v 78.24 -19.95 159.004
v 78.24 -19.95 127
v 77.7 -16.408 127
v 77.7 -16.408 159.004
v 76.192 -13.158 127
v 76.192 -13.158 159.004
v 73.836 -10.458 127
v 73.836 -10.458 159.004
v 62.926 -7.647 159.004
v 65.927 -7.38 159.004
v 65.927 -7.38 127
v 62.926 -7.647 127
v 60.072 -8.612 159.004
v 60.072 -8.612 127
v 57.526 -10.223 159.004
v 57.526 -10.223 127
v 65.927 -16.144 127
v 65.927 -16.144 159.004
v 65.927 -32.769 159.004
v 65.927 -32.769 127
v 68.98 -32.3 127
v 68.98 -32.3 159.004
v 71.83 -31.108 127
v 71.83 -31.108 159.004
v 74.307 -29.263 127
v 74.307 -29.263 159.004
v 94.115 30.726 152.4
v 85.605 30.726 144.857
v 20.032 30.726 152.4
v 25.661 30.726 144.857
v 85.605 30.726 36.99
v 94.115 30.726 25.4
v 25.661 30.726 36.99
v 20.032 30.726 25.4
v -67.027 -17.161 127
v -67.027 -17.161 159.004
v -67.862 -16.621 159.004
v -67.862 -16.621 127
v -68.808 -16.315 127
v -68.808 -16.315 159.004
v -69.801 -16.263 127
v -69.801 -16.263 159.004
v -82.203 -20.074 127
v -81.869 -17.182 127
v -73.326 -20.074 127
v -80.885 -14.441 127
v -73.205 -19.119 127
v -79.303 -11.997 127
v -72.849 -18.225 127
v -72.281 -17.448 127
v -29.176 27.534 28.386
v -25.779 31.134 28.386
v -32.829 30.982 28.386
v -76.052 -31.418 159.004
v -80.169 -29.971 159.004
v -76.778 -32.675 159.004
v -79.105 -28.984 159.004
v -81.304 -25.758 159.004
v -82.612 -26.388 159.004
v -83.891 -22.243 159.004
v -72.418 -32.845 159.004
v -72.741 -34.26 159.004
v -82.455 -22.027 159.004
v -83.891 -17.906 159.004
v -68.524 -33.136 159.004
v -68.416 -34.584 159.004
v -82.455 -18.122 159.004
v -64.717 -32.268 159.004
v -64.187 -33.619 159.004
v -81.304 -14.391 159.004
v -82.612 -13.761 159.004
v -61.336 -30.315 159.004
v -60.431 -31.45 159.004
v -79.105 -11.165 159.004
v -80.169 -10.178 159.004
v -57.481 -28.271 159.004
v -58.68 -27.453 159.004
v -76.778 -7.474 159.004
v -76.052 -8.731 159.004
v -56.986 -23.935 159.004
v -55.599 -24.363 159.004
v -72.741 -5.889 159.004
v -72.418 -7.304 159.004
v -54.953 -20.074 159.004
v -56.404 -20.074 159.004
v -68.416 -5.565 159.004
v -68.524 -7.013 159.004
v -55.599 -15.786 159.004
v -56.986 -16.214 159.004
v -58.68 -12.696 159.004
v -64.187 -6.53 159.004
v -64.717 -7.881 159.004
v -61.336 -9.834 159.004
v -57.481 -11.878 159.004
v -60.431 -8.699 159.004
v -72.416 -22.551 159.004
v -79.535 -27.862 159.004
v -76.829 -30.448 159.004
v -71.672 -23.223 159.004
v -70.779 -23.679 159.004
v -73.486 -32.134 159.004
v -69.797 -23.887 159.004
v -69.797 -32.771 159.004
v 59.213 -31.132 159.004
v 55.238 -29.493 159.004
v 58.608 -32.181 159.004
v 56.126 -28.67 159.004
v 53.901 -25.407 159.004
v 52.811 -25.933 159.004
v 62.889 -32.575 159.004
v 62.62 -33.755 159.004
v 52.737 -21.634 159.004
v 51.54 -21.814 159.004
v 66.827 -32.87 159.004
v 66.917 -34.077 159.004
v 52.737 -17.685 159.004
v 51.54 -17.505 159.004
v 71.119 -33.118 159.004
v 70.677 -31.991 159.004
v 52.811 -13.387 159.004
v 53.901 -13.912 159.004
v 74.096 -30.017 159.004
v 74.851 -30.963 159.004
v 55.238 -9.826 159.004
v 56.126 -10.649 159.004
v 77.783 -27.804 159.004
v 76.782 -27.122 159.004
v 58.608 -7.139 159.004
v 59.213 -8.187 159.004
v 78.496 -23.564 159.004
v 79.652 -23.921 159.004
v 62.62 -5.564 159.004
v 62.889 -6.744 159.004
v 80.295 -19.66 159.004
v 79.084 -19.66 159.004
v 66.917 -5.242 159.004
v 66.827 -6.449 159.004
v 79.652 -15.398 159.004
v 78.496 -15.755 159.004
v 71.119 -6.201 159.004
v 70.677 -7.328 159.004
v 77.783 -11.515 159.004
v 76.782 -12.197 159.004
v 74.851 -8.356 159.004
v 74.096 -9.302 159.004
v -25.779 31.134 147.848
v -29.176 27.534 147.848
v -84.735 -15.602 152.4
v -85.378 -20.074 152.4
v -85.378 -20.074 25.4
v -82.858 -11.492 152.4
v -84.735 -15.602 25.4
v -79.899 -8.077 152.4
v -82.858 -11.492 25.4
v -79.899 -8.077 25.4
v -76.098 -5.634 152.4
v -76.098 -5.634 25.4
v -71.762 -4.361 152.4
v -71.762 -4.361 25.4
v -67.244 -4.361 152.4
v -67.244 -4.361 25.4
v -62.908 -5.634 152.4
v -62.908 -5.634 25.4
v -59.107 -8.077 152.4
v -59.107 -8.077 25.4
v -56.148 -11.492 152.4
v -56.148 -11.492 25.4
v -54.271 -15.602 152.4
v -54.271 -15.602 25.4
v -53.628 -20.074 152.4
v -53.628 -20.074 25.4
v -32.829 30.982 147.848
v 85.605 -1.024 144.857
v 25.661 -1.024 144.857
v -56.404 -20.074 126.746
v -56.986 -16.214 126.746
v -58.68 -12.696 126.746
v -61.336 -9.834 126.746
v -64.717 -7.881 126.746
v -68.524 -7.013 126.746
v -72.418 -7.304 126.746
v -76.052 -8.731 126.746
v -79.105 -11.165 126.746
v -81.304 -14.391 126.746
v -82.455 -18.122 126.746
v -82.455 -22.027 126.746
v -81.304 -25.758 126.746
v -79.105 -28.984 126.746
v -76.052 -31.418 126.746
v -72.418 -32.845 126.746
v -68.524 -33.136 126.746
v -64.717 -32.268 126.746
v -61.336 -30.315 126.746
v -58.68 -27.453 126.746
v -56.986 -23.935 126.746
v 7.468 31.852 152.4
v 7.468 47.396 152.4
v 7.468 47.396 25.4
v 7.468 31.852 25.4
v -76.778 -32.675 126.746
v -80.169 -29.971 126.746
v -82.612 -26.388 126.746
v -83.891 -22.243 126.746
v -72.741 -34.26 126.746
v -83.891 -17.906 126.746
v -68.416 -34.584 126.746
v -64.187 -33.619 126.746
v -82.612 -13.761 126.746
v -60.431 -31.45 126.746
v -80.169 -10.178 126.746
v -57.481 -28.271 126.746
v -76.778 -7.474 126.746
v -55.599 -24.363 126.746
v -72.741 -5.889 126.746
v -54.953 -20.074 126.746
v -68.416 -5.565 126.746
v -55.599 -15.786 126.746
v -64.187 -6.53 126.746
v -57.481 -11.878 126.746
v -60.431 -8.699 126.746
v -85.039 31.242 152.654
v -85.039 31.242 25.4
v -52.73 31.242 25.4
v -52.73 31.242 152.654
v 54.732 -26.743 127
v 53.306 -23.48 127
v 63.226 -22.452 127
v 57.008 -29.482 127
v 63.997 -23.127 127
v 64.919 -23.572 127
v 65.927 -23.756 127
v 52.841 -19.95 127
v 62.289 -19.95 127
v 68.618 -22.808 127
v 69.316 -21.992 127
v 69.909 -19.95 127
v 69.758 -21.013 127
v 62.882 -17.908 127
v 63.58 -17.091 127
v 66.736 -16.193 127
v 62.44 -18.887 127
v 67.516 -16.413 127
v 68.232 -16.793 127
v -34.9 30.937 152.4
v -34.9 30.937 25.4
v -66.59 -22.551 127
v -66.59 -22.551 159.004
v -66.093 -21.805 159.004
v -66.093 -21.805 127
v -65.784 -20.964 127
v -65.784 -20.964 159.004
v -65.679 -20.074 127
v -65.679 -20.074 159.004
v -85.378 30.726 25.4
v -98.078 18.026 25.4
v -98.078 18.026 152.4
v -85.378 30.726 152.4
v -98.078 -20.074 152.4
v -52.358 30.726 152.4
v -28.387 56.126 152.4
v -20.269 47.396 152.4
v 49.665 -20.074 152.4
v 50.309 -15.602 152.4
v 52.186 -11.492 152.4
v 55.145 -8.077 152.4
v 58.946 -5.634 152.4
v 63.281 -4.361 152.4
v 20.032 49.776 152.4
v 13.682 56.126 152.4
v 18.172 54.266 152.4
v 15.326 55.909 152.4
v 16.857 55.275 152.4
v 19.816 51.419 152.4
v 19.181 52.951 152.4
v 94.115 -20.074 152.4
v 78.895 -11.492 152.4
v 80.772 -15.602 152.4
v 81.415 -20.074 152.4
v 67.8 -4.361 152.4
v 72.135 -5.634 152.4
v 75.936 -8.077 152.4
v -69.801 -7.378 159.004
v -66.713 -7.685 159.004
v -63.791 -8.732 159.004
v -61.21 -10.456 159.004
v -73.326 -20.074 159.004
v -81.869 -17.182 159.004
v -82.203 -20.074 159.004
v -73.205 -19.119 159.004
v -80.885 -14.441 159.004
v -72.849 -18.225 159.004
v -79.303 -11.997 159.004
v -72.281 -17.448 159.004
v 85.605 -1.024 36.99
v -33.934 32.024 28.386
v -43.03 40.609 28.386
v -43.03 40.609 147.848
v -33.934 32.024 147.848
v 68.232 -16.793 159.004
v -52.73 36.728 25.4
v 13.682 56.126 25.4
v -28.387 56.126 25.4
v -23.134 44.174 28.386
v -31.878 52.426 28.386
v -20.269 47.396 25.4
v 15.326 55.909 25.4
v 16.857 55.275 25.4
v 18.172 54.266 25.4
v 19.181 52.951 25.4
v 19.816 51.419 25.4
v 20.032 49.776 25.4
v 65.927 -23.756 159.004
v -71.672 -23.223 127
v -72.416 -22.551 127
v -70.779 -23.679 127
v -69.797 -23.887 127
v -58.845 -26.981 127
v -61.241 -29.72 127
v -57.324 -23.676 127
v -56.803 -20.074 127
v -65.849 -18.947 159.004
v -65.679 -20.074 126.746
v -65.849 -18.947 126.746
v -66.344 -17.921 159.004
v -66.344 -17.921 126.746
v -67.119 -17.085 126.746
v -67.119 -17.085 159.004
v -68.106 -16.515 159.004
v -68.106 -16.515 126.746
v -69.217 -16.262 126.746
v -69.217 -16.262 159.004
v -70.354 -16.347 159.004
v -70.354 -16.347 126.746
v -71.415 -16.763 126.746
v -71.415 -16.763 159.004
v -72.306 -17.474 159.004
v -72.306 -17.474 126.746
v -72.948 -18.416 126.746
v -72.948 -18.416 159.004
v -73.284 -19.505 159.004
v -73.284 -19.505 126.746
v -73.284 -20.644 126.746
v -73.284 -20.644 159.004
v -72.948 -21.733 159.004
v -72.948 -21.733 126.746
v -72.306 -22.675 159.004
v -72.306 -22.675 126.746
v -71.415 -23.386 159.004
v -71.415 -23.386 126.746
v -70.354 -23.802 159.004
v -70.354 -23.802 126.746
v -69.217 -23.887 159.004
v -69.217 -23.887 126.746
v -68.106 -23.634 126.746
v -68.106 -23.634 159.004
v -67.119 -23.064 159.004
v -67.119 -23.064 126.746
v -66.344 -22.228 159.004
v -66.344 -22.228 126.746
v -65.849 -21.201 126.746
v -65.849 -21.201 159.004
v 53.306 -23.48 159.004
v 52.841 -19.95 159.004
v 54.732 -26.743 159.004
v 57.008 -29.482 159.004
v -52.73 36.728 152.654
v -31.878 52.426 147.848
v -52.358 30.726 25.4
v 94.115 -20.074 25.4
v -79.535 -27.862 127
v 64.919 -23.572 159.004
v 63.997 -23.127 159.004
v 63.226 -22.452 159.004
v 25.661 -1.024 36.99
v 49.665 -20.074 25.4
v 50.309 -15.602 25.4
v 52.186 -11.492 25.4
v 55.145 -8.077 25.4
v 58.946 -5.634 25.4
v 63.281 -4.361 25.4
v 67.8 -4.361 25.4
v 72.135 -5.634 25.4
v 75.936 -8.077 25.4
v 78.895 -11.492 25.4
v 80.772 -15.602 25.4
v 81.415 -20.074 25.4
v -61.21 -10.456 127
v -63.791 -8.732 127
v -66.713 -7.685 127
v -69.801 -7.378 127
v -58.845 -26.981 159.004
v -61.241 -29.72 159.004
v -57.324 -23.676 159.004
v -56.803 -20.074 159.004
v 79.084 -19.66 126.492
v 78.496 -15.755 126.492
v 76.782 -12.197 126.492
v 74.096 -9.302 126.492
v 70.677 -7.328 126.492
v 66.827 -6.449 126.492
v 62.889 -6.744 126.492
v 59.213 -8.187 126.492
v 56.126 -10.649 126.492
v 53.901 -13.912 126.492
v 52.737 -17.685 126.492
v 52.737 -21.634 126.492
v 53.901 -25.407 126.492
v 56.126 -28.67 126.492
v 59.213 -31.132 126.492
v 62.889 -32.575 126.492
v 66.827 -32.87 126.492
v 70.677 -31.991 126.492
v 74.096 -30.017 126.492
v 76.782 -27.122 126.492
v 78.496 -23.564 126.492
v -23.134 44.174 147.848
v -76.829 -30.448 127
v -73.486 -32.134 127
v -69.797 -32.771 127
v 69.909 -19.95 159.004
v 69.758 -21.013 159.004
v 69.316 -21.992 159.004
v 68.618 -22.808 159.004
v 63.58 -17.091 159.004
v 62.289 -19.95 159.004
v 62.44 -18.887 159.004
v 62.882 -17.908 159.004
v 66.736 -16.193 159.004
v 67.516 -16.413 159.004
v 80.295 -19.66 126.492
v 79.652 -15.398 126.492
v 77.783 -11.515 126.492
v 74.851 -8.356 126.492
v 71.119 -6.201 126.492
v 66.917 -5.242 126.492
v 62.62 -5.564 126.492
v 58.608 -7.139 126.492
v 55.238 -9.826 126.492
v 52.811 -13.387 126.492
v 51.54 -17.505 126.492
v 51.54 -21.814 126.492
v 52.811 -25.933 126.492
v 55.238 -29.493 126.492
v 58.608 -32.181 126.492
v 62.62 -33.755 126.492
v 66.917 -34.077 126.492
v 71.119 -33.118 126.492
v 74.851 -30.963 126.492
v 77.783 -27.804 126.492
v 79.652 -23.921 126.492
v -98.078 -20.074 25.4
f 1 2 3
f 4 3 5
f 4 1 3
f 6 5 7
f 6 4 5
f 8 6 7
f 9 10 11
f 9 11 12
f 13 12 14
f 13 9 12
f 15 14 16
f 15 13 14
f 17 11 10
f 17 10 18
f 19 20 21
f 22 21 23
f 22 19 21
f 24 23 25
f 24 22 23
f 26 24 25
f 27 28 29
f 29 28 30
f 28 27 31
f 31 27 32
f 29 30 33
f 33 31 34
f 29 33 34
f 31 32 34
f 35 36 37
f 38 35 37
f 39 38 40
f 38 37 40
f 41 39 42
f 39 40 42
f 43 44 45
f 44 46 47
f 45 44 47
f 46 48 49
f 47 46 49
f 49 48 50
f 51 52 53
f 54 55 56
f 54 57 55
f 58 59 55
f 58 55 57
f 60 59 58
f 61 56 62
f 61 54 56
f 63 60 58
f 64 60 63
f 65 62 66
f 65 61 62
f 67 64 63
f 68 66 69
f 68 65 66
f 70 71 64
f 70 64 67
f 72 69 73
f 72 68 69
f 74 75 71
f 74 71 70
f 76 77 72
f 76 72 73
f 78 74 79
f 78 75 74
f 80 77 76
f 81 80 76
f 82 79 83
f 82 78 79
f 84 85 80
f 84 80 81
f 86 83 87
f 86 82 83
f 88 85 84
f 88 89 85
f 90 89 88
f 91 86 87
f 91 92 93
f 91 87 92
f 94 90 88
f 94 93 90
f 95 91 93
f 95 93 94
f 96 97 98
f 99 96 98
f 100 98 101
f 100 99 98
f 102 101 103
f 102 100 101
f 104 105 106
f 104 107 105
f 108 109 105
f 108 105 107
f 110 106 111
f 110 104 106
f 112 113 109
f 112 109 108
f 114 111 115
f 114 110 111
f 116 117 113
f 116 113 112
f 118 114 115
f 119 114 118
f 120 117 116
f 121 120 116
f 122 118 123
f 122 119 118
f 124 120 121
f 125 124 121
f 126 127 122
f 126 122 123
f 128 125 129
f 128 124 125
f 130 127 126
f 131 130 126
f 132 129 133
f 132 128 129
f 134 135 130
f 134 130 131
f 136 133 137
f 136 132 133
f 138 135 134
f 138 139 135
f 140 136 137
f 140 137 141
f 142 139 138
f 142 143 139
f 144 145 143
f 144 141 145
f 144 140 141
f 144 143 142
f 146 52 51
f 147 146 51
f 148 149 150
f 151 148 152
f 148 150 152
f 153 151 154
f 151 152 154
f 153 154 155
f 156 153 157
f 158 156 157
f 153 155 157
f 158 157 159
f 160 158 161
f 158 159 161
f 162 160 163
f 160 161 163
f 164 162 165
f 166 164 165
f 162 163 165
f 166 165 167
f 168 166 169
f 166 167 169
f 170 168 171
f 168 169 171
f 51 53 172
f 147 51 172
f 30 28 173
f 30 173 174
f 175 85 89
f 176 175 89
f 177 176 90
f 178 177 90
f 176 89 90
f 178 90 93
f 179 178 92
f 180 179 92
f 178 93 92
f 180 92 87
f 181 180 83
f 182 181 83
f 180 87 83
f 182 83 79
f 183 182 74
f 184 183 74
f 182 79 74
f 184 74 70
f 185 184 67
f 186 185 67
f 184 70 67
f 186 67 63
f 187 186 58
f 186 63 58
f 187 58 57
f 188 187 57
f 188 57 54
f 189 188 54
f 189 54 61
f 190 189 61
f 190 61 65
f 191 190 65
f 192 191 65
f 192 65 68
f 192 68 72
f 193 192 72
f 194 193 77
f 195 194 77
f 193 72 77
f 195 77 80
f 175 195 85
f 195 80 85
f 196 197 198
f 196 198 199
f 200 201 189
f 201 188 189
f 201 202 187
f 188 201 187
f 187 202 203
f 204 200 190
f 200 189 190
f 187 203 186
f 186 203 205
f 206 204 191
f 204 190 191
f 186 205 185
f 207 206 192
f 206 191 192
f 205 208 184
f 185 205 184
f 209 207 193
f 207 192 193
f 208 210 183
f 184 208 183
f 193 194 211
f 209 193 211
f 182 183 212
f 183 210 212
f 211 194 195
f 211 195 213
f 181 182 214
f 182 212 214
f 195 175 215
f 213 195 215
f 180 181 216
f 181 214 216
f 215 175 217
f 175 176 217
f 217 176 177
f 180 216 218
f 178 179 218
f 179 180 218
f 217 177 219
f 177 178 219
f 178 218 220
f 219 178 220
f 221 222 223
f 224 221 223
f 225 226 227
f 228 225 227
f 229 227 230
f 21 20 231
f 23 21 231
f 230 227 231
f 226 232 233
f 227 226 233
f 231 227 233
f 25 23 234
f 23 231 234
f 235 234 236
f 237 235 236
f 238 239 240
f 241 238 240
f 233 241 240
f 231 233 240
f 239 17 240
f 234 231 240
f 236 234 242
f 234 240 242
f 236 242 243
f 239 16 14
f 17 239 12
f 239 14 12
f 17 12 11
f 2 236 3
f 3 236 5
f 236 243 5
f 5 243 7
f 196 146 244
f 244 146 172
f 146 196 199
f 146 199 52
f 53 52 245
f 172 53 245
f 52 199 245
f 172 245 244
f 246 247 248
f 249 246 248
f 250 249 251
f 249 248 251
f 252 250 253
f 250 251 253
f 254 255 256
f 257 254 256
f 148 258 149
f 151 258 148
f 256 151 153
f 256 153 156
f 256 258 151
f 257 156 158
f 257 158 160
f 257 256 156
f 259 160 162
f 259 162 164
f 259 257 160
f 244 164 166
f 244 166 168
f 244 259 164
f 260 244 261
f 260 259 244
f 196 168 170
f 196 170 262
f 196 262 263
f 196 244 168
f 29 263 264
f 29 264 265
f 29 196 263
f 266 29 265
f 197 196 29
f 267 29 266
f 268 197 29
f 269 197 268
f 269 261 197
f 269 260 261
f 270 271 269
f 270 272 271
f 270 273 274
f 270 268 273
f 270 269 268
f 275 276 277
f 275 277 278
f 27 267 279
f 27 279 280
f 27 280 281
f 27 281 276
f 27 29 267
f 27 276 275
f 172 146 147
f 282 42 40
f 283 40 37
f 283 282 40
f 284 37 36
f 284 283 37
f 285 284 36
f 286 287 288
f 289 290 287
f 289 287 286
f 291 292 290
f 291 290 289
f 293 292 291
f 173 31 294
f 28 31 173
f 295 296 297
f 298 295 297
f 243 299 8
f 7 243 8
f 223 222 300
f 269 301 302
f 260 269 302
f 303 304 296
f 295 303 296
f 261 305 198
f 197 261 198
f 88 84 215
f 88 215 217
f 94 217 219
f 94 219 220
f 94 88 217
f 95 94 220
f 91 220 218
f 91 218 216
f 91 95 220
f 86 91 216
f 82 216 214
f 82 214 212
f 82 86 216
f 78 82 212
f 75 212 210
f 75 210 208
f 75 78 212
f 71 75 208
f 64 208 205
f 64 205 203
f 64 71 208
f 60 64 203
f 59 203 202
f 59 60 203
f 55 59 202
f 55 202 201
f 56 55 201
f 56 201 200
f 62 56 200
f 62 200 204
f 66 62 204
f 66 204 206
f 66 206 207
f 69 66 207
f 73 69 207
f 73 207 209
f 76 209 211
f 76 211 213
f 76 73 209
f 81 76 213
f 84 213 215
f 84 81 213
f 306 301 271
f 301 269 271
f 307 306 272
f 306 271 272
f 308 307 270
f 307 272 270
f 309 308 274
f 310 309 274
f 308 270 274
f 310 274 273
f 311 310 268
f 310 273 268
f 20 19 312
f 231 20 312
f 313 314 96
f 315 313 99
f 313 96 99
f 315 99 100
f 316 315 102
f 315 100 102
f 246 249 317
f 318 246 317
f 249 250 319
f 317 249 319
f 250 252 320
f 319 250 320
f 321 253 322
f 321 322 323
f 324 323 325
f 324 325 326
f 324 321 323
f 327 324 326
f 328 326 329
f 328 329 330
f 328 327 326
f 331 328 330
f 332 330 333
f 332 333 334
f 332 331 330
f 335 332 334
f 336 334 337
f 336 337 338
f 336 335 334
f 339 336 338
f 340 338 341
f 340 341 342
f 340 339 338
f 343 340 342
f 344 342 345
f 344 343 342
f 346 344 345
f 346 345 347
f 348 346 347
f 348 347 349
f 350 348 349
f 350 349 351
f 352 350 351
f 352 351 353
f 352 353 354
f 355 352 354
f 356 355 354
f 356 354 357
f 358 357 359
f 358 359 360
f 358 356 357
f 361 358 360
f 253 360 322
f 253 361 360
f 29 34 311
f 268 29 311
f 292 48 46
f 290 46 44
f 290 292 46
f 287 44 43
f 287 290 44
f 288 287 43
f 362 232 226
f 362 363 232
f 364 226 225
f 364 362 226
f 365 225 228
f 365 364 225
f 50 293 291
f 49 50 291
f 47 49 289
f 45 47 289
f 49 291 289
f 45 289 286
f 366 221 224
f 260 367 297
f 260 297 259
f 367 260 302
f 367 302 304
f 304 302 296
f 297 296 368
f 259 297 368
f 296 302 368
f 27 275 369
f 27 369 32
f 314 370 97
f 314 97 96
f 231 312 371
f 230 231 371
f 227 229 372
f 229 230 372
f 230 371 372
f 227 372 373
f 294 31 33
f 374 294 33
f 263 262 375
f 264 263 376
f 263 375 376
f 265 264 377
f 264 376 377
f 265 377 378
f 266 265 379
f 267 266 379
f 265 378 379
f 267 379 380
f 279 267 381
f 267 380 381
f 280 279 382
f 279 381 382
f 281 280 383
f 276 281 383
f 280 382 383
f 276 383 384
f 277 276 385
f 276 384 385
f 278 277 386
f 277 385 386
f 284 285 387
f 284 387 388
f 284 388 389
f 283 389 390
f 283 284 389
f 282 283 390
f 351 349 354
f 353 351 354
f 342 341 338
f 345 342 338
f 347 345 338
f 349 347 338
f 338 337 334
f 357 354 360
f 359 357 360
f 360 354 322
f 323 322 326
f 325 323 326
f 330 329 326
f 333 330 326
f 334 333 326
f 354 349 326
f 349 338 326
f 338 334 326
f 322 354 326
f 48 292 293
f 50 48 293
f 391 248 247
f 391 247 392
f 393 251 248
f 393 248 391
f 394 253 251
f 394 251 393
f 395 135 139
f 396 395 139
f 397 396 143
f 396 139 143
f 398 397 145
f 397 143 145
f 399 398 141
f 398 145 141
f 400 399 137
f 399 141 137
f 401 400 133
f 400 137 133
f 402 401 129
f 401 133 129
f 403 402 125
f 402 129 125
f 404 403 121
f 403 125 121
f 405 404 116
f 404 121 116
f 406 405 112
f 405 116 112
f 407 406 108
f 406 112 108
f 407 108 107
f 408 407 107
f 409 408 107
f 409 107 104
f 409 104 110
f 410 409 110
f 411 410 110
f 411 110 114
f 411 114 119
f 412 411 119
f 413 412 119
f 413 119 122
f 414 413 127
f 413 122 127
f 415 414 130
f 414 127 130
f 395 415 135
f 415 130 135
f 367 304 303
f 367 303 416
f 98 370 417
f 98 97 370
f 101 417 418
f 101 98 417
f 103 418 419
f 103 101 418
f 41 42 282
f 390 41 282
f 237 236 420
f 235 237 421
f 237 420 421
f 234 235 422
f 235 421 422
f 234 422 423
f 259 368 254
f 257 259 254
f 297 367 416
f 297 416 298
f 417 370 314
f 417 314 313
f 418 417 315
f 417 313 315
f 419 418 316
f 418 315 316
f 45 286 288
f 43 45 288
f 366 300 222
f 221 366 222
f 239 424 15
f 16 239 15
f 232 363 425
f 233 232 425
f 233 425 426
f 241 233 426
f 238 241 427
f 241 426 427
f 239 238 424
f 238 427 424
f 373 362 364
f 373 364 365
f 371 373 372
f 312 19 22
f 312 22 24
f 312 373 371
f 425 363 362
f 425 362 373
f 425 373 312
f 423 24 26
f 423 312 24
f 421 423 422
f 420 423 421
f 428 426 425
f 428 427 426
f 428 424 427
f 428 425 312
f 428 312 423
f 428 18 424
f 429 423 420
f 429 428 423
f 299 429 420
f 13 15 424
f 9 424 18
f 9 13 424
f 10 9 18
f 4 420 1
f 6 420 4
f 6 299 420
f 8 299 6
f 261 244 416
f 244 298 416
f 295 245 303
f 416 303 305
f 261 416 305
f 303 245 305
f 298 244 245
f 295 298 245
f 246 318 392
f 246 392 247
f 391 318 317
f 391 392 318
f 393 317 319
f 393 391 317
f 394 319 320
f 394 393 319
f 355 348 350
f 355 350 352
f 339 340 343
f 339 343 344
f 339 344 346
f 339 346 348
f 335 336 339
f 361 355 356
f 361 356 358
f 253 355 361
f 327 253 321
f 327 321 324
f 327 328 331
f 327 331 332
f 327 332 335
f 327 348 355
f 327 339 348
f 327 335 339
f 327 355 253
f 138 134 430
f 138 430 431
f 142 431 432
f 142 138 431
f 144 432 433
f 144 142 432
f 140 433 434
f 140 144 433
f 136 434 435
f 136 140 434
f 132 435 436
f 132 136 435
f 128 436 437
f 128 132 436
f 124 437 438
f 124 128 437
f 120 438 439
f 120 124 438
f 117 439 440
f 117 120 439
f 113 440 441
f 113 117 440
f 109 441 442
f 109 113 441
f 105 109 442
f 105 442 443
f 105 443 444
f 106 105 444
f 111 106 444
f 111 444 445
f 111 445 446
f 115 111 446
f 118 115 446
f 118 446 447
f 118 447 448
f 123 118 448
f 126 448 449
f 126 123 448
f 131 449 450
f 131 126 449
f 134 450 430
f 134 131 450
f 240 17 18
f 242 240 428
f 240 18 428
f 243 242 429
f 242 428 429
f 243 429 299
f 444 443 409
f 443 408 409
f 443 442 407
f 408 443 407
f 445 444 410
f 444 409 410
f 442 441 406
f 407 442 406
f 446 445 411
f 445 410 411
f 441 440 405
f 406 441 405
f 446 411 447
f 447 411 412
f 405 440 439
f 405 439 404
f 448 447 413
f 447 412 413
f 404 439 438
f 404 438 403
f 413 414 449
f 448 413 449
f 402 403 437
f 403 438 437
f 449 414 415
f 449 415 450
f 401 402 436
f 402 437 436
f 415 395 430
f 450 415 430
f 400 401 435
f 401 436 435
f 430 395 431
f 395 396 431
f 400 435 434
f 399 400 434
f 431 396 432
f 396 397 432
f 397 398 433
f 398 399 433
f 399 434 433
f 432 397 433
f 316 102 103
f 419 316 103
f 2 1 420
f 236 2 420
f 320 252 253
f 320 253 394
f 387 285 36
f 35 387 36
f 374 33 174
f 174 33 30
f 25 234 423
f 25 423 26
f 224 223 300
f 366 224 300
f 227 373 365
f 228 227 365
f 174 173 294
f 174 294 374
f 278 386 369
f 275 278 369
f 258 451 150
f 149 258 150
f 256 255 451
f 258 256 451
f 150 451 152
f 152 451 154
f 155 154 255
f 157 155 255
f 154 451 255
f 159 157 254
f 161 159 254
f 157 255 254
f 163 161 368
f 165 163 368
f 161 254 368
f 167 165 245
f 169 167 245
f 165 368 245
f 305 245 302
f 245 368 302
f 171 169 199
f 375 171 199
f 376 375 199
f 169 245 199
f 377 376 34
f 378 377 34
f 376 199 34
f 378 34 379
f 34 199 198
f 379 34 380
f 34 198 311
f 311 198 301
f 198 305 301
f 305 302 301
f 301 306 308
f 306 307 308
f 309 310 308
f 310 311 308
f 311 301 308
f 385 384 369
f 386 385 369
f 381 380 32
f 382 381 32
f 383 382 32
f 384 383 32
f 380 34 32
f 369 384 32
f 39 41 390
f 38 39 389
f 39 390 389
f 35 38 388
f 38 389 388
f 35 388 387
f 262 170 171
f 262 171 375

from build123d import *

# Parameters (mm, degrees)
F1_DEPTH       = 25.4
F3_DEPTH       = 127
F4_SIZE        = 12.7
F6_R           = 6.35
F8_DEPTH       = 152.654
F10_DEPTH      = 25.4
F12_DEPTH      = 25.4
F13_W          = 16.2486957626
F13_H          = 119.4617953151
F14_DEPTH      = 19.05
F15_W          = 59.9437842466
F15_H          = 107.8668609262
F16_DEPTH      = 31.75
F17_R          = 12.7
F18_DEPTH      = 6.604
F18_DEPTH_BACK = 25.4
F20_DEPTH      = 42.672
F21_R          = 14.5503391108
F21_R_2        = 13.0985920163
F22_DEPTH      = 32.258
F23_R          = 3.8234210024
F24_DEPTH      = 32.258
F26_DEPTH      = 37.592
F27_R          = 14.4579304603
F27_R_2        = 13.2474049672
F28_DEPTH      = 32.512


with BuildPart() as f1:
    # F0 (on Top) → F1 (new body)
    with BuildSketch(Plane.XY):
        with BuildLine():
            Line((-98.0778662412, 30.7255328881), (-98.0778662412, -20.0744671119))
            Line((-98.0778662412, -20.0744671119), (-85.3778662412, -20.0744671119))
            ThreePointArc((-85.3778662412, -20.0744671119), (-69.5028662412, -4.1994671119), (-53.6278662412, -20.0744671119))
            Line((-53.6278662412, -20.0744671119), (49.6654686659, -20.0744671119))
            ThreePointArc((49.6654686659, -20.0744671119), (65.5404686659, -4.1994671119), (81.4154686659, -20.0744671119))
            Line((81.4154686659, -20.0744671119), (94.1154686659, -20.0744671119))
            Line((94.1154686659, -20.0744671119), (94.1154686659, 30.7255328881))
            Line((94.1154686659, 30.7255328881), (20.0321313981, 30.7255328881))
            Line((20.0321313981, 30.7255328881), (20.0321313981, 56.1255328881))
            Line((20.0321313981, 56.1255328881), (-28.3871404864, 56.1255328881))
            Line((-28.3871404864, 56.1255328881), (-52.3578648184, 30.7255328881))
            Line((-52.3578648184, 30.7255328881), (-98.0778662412, 30.7255328881))
        make_face()
        Polygon((7.467600517, 31.8516008556), (-34.8995998502, 30.9372004122), (-20.2692002058, 47.3963990808), (7.467600517, 47.3963990808), align=None, mode=Mode.SUBTRACT)
    extrude(amount=F1_DEPTH)


with BuildPart() as f3:
    # F2 (on face) → F3 (new body)
    with BuildSketch(Plane.XY.offset(25.4)):
        with BuildLine():
            Line((-28.3871404864, 56.1255328881), (-52.3578648184, 30.7255328881))
            Line((-52.3578648184, 30.7255328881), (-98.0778662412, 30.7255328881))
            Line((-98.0778662412, 30.7255328881), (-98.0778662412, -20.0744671119))
            Line((-98.0778662412, -20.0744671119), (-85.3778662412, -20.0744671119))
            ThreePointArc((-85.3778662412, -20.0744671119), (-69.5028662412, -4.1994671119), (-53.6278662412, -20.0744671119))
            Line((-53.6278662412, -20.0744671119), (49.6654686659, -20.0744671119))
            ThreePointArc((49.6654686659, -20.0744671119), (65.5404686659, -4.1994671119), (81.4154686659, -20.0744671119))
            Line((81.4154686659, -20.0744671119), (94.1154686659, -20.0744671119))
            Line((94.1154686659, -20.0744671119), (94.1154686659, 30.7255328881))
            Line((94.1154686659, 30.7255328881), (20.0321313981, 30.7255328881))
            Line((20.0321313981, 30.7255328881), (20.0321313981, 56.1255328881))
            Line((20.0321313981, 56.1255328881), (-28.3871404864, 56.1255328881))
        make_face()
        Polygon((7.467600517, 47.3963990808), (7.467600517, 31.8516008556), (-34.8995998502, 30.9372004122), (-20.2692002058, 47.3963990808), align=None, mode=Mode.SUBTRACT)
    extrude(amount=F3_DEPTH)

    # F4
    f4_edges = [f3.edges().sort_by_distance(p)[0] for p in [
        (-98.077866, 30.725533, 88.9),
    ]]
    chamfer(f4_edges, length=F4_SIZE)

    # F6
    f6_edges = [f3.edges().sort_by_distance(p)[0] for p in [
        (20.032131, 56.125533, 88.9),
    ]]
    fillet(f6_edges, radius=F6_R)

    # F13 (on face) → F14 (cut)
    with BuildSketch(Plane(origin=(-43.0304532091, 40.6090996754, 0), x_dir=(-0.686348585, -0.7272727273, 0), z_dir=(-0.7272727273, 0.686348585, 0))):
        with Locations((-8.1243478813, 88.1171720102)):
            Rectangle(F13_W, F13_H)
    extrude(amount=-F14_DEPTH, mode=Mode.SUBTRACT)

    # F15 (on face) → F16 (cut)
    with BuildSketch(Plane(origin=(0, 30.7255328881, 0), x_dir=(-1, 0, 0), z_dir=(0, 1, 0))):
        with Locations((-55.6326190781, 90.9239016473)):
            Rectangle(F15_W, F15_H)
    extrude(amount=-F16_DEPTH, mode=Mode.SUBTRACT)


with BuildPart() as f8:
    # F7 (on Top) → F8 (new body)
    with BuildSketch(Plane.XY):
        Polygon((-52.7304001153, 36.728400737), (-85.0391983986, 31.2420018017), (-52.7304001153, 31.2420018017), align=None)
    extrude(amount=F8_DEPTH)

    # F9 (on Top) → F10 (cut)
    with BuildSketch(Plane.XY):
        Polygon((-53.0351996422, 37.033200264), (-84.1248035431, 31.8516008556), (-53.0351996422, 30.0227999687), align=None)
    extrude(amount=F10_DEPTH, mode=Mode.SUBTRACT)

    # F11 (on Top) → F12 (cut)
    with BuildSketch(Plane.XY):
        Polygon((-45.1124533736, 57.0361010675), (-89.001595974, 44.9580028653), (-89.001595974, 20.2692002058), (-43.2815998793, 22.7076001465), align=None)
    extrude(amount=F12_DEPTH, mode=Mode.SUBTRACT)


with BuildPart() as f18:
    # F17 (on face) → F18 (new body, two sides)
    with BuildSketch(Plane.XY.offset(152.4)) as f18_sk:
        with Locations((-69.5028662412, -20.0744671119)):
            Circle(F17_R)
    extrude(amount=F18_DEPTH)
    extrude(f18_sk.sketch, amount=-F18_DEPTH_BACK)

    # F19 (on face) → F20 (cut)
    with BuildSketch(Plane.XY.offset(159.004)):
        with BuildLine():
            ThreePointArc((-66.589683144, -22.5507369687), (-65.9142123432, -21.3935999187), (-65.6794452388, -20.0744671119))
            ThreePointArc((-65.6794452388, -20.0744671119), (-66.032546227, -18.4696533654), (-67.0266299507, -17.1612554829))
            ThreePointArc((-67.0266299507, -17.1612554829), (-68.324810941, -16.4370595363), (-69.8010662799, -16.2626926041))
            ThreePointArc((-69.8010662799, -16.2626926041), (-71.151311703, -16.6246590417), (-72.2811957686, -17.4477898956))
            ThreePointArc((-72.2811957686, -17.4477898956), (-73.055419663, -18.6609918389), (-73.3262872437, -20.0744671119))
            ThreePointArc((-73.3262872437, -20.0744671119), (-73.0915201393, -21.3935999187), (-72.4160493385, -22.5507369687))
            ThreePointArc((-72.4160493385, -22.5507369687), (-71.2402750017, -23.4803383603), (-69.7974926492, -23.8865195042))
            ThreePointArc((-69.7974926492, -23.8865195042), (-68.0330742392, -23.6040931024), (-66.589683144, -22.5507369687))
        make_face()
        with BuildLine():
            Line((-61.24115574, -29.719887766), (-66.589683144, -22.5507369687))
            ThreePointArc((-66.589683144, -22.5507369687), (-68.0330742392, -23.6040931024), (-69.7974926492, -23.8865195042))
            Line((-69.7974926492, -23.8865195042), (-69.7974926492, -32.7710491433))
            ThreePointArc((-69.7974926492, -32.7710491433), (-65.2371888419, -32.0366573932), (-61.24115574, -29.719887766))
        make_face()
        with BuildLine():
            Line((-79.535111766, -27.861896067), (-72.4160493385, -22.5507369687))
            ThreePointArc((-72.4160493385, -22.5507369687), (-73.0915201393, -21.3935999187), (-73.3262872437, -20.0744671119))
            Line((-73.3262872437, -20.0744671119), (-82.2028662412, -20.0744671119))
            ThreePointArc((-82.2028662412, -20.0744671119), (-81.5174306979, -24.1903195045), (-79.535111766, -27.861896067))
        make_face()
        with BuildLine():
            ThreePointArc((-72.2811957686, -17.4477898956), (-71.151311703, -16.6246590417), (-69.8010662799, -16.2626926041))
            Line((-69.8010662799, -16.2626926041), (-69.8010662799, -7.3779685104))
            ThreePointArc((-69.8010662799, -7.3779685104), (-75.0552484987, -8.6525123201), (-79.3031619466, -11.9970786672))
            Line((-79.3031619466, -11.9970786672), (-72.2811957686, -17.4477898956))
        make_face()
        with BuildLine():
            ThreePointArc((-67.0266299507, -17.1612554829), (-66.032546227, -18.4696533654), (-65.6794452388, -20.0744671119))
            Line((-65.6794452388, -20.0744671119), (-56.8028662412, -20.0744671119))
            ThreePointArc((-56.8028662412, -20.0744671119), (-57.957143405, -14.7842606709), (-61.2101550899, -10.4556864324))
            Line((-61.2101550899, -10.4556864324), (-67.0266299507, -17.1612554829))
        make_face()
    extrude(amount=-F20_DEPTH, mode=Mode.SUBTRACT)


with BuildPart() as f18b:
    # F17 (on face) → F18, piece 2 (new body, two sides)
    with BuildSketch(Plane.XY.offset(152.4)) as f18_2_sk:
        with Locations((65.5404686659, -20.0744671119)):
            Circle(F17_R)
    extrude(amount=F18_DEPTH)
    extrude(f18_2_sk.sketch, amount=-F18_DEPTH_BACK)

    # F25 (on face) → F26 (cut)
    with BuildSketch(Plane.XY.offset(159.004)):
        with BuildLine():
            Line((63.5799478034, -17.0914367663), (57.5261820487, -10.2225023323))
            ThreePointArc((57.5261820487, -10.2225023323), (54.0984828398, -14.5634816868), (52.8410808041, -19.9497757508))
            Line((52.8410808041, -19.9497757508), (62.2890742888, -19.9497757508))
            ThreePointArc((62.2890742888, -19.9497757508), (62.6267572015, -18.3816194942), (63.5799478034, -17.0914367663))
        make_face()
        with BuildLine():
            ThreePointArc((73.8361295373, -10.4582302853), (70.1461167495, -8.239011661), (65.9266607232, -7.380340293))
            Line((65.9266607232, -7.380340293), (65.9266607232, -16.1436788574))
            ThreePointArc((65.9266607232, -16.1436788574), (67.1318990539, -16.2824370694), (68.2324145932, -16.7930433983))
            Line((68.2324145932, -16.7930433983), (73.8361295373, -10.4582302853))
        make_face()
        with BuildLine():
            ThreePointArc((78.2404686659, -20.0744671119), (78.2403156304, -20.0121206801), (78.2398565277, -19.9497757508))
            Line((78.2398565277, -19.9497757508), (69.9090742888, -19.9497757508))
            ThreePointArc((69.9090742888, -19.9497757508), (69.5713913761, -21.5179320075), (68.6182007743, -22.8081147353))
            Line((68.6182007743, -22.8081147353), (74.3072586548, -29.2632316257))
            ThreePointArc((74.3072586548, -29.2632316257), (77.2158323189, -25.072054887), (78.2404686659, -20.0744671119))
        make_face()
        with BuildLine():
            Line((63.226239122, -22.4523580381), (57.0083197097, -29.4815088462))
            ThreePointArc((57.0083197097, -29.4815088462), (61.1483865243, -31.9908262229), (65.9266607232, -32.7685939308))
            Line((65.9266607232, -32.7685939308), (65.9266607232, -23.7558726443))
            ThreePointArc((65.9266607232, -23.7558726443), (64.4428217287, -23.3809457346), (63.226239122, -22.4523580381))
        make_face()
    extrude(amount=-F26_DEPTH, mode=Mode.SUBTRACT)


with BuildPart() as f22:
    # F21 (on face) → F22 (new body)
    with BuildSketch(Plane.XY.offset(159.004)):
        with Locations((-69.5028662412, -20.0744671119)):
            Circle(F21_R)
        with Locations((-69.5028662412, -20.0744671119)):
            Circle(F21_R_2, mode=Mode.SUBTRACT)
    extrude(amount=-F22_DEPTH)


with BuildPart() as f24:
    # F23 (on face) → F24 (new body)
    with BuildSketch(Plane.XY.offset(159.004)):
        with Locations((-69.5028662412, -20.0744671119)):
            Circle(F23_R)
    extrude(amount=-F24_DEPTH)


with BuildPart() as f28:
    # F27 (on face) → F28 (new body)
    with BuildSketch(Plane.XY.offset(159.004)):
        with Locations((65.8368095756, -19.6596011519)):
            Circle(F27_R)
        with Locations((65.8368095756, -19.6596011519)):
            Circle(F27_R_2, mode=Mode.SUBTRACT)
    extrude(amount=-F28_DEPTH)


solid = Compound([f3.part, f8.part, f18.part, f18b.part, f22.part, f24.part, f28.part])
